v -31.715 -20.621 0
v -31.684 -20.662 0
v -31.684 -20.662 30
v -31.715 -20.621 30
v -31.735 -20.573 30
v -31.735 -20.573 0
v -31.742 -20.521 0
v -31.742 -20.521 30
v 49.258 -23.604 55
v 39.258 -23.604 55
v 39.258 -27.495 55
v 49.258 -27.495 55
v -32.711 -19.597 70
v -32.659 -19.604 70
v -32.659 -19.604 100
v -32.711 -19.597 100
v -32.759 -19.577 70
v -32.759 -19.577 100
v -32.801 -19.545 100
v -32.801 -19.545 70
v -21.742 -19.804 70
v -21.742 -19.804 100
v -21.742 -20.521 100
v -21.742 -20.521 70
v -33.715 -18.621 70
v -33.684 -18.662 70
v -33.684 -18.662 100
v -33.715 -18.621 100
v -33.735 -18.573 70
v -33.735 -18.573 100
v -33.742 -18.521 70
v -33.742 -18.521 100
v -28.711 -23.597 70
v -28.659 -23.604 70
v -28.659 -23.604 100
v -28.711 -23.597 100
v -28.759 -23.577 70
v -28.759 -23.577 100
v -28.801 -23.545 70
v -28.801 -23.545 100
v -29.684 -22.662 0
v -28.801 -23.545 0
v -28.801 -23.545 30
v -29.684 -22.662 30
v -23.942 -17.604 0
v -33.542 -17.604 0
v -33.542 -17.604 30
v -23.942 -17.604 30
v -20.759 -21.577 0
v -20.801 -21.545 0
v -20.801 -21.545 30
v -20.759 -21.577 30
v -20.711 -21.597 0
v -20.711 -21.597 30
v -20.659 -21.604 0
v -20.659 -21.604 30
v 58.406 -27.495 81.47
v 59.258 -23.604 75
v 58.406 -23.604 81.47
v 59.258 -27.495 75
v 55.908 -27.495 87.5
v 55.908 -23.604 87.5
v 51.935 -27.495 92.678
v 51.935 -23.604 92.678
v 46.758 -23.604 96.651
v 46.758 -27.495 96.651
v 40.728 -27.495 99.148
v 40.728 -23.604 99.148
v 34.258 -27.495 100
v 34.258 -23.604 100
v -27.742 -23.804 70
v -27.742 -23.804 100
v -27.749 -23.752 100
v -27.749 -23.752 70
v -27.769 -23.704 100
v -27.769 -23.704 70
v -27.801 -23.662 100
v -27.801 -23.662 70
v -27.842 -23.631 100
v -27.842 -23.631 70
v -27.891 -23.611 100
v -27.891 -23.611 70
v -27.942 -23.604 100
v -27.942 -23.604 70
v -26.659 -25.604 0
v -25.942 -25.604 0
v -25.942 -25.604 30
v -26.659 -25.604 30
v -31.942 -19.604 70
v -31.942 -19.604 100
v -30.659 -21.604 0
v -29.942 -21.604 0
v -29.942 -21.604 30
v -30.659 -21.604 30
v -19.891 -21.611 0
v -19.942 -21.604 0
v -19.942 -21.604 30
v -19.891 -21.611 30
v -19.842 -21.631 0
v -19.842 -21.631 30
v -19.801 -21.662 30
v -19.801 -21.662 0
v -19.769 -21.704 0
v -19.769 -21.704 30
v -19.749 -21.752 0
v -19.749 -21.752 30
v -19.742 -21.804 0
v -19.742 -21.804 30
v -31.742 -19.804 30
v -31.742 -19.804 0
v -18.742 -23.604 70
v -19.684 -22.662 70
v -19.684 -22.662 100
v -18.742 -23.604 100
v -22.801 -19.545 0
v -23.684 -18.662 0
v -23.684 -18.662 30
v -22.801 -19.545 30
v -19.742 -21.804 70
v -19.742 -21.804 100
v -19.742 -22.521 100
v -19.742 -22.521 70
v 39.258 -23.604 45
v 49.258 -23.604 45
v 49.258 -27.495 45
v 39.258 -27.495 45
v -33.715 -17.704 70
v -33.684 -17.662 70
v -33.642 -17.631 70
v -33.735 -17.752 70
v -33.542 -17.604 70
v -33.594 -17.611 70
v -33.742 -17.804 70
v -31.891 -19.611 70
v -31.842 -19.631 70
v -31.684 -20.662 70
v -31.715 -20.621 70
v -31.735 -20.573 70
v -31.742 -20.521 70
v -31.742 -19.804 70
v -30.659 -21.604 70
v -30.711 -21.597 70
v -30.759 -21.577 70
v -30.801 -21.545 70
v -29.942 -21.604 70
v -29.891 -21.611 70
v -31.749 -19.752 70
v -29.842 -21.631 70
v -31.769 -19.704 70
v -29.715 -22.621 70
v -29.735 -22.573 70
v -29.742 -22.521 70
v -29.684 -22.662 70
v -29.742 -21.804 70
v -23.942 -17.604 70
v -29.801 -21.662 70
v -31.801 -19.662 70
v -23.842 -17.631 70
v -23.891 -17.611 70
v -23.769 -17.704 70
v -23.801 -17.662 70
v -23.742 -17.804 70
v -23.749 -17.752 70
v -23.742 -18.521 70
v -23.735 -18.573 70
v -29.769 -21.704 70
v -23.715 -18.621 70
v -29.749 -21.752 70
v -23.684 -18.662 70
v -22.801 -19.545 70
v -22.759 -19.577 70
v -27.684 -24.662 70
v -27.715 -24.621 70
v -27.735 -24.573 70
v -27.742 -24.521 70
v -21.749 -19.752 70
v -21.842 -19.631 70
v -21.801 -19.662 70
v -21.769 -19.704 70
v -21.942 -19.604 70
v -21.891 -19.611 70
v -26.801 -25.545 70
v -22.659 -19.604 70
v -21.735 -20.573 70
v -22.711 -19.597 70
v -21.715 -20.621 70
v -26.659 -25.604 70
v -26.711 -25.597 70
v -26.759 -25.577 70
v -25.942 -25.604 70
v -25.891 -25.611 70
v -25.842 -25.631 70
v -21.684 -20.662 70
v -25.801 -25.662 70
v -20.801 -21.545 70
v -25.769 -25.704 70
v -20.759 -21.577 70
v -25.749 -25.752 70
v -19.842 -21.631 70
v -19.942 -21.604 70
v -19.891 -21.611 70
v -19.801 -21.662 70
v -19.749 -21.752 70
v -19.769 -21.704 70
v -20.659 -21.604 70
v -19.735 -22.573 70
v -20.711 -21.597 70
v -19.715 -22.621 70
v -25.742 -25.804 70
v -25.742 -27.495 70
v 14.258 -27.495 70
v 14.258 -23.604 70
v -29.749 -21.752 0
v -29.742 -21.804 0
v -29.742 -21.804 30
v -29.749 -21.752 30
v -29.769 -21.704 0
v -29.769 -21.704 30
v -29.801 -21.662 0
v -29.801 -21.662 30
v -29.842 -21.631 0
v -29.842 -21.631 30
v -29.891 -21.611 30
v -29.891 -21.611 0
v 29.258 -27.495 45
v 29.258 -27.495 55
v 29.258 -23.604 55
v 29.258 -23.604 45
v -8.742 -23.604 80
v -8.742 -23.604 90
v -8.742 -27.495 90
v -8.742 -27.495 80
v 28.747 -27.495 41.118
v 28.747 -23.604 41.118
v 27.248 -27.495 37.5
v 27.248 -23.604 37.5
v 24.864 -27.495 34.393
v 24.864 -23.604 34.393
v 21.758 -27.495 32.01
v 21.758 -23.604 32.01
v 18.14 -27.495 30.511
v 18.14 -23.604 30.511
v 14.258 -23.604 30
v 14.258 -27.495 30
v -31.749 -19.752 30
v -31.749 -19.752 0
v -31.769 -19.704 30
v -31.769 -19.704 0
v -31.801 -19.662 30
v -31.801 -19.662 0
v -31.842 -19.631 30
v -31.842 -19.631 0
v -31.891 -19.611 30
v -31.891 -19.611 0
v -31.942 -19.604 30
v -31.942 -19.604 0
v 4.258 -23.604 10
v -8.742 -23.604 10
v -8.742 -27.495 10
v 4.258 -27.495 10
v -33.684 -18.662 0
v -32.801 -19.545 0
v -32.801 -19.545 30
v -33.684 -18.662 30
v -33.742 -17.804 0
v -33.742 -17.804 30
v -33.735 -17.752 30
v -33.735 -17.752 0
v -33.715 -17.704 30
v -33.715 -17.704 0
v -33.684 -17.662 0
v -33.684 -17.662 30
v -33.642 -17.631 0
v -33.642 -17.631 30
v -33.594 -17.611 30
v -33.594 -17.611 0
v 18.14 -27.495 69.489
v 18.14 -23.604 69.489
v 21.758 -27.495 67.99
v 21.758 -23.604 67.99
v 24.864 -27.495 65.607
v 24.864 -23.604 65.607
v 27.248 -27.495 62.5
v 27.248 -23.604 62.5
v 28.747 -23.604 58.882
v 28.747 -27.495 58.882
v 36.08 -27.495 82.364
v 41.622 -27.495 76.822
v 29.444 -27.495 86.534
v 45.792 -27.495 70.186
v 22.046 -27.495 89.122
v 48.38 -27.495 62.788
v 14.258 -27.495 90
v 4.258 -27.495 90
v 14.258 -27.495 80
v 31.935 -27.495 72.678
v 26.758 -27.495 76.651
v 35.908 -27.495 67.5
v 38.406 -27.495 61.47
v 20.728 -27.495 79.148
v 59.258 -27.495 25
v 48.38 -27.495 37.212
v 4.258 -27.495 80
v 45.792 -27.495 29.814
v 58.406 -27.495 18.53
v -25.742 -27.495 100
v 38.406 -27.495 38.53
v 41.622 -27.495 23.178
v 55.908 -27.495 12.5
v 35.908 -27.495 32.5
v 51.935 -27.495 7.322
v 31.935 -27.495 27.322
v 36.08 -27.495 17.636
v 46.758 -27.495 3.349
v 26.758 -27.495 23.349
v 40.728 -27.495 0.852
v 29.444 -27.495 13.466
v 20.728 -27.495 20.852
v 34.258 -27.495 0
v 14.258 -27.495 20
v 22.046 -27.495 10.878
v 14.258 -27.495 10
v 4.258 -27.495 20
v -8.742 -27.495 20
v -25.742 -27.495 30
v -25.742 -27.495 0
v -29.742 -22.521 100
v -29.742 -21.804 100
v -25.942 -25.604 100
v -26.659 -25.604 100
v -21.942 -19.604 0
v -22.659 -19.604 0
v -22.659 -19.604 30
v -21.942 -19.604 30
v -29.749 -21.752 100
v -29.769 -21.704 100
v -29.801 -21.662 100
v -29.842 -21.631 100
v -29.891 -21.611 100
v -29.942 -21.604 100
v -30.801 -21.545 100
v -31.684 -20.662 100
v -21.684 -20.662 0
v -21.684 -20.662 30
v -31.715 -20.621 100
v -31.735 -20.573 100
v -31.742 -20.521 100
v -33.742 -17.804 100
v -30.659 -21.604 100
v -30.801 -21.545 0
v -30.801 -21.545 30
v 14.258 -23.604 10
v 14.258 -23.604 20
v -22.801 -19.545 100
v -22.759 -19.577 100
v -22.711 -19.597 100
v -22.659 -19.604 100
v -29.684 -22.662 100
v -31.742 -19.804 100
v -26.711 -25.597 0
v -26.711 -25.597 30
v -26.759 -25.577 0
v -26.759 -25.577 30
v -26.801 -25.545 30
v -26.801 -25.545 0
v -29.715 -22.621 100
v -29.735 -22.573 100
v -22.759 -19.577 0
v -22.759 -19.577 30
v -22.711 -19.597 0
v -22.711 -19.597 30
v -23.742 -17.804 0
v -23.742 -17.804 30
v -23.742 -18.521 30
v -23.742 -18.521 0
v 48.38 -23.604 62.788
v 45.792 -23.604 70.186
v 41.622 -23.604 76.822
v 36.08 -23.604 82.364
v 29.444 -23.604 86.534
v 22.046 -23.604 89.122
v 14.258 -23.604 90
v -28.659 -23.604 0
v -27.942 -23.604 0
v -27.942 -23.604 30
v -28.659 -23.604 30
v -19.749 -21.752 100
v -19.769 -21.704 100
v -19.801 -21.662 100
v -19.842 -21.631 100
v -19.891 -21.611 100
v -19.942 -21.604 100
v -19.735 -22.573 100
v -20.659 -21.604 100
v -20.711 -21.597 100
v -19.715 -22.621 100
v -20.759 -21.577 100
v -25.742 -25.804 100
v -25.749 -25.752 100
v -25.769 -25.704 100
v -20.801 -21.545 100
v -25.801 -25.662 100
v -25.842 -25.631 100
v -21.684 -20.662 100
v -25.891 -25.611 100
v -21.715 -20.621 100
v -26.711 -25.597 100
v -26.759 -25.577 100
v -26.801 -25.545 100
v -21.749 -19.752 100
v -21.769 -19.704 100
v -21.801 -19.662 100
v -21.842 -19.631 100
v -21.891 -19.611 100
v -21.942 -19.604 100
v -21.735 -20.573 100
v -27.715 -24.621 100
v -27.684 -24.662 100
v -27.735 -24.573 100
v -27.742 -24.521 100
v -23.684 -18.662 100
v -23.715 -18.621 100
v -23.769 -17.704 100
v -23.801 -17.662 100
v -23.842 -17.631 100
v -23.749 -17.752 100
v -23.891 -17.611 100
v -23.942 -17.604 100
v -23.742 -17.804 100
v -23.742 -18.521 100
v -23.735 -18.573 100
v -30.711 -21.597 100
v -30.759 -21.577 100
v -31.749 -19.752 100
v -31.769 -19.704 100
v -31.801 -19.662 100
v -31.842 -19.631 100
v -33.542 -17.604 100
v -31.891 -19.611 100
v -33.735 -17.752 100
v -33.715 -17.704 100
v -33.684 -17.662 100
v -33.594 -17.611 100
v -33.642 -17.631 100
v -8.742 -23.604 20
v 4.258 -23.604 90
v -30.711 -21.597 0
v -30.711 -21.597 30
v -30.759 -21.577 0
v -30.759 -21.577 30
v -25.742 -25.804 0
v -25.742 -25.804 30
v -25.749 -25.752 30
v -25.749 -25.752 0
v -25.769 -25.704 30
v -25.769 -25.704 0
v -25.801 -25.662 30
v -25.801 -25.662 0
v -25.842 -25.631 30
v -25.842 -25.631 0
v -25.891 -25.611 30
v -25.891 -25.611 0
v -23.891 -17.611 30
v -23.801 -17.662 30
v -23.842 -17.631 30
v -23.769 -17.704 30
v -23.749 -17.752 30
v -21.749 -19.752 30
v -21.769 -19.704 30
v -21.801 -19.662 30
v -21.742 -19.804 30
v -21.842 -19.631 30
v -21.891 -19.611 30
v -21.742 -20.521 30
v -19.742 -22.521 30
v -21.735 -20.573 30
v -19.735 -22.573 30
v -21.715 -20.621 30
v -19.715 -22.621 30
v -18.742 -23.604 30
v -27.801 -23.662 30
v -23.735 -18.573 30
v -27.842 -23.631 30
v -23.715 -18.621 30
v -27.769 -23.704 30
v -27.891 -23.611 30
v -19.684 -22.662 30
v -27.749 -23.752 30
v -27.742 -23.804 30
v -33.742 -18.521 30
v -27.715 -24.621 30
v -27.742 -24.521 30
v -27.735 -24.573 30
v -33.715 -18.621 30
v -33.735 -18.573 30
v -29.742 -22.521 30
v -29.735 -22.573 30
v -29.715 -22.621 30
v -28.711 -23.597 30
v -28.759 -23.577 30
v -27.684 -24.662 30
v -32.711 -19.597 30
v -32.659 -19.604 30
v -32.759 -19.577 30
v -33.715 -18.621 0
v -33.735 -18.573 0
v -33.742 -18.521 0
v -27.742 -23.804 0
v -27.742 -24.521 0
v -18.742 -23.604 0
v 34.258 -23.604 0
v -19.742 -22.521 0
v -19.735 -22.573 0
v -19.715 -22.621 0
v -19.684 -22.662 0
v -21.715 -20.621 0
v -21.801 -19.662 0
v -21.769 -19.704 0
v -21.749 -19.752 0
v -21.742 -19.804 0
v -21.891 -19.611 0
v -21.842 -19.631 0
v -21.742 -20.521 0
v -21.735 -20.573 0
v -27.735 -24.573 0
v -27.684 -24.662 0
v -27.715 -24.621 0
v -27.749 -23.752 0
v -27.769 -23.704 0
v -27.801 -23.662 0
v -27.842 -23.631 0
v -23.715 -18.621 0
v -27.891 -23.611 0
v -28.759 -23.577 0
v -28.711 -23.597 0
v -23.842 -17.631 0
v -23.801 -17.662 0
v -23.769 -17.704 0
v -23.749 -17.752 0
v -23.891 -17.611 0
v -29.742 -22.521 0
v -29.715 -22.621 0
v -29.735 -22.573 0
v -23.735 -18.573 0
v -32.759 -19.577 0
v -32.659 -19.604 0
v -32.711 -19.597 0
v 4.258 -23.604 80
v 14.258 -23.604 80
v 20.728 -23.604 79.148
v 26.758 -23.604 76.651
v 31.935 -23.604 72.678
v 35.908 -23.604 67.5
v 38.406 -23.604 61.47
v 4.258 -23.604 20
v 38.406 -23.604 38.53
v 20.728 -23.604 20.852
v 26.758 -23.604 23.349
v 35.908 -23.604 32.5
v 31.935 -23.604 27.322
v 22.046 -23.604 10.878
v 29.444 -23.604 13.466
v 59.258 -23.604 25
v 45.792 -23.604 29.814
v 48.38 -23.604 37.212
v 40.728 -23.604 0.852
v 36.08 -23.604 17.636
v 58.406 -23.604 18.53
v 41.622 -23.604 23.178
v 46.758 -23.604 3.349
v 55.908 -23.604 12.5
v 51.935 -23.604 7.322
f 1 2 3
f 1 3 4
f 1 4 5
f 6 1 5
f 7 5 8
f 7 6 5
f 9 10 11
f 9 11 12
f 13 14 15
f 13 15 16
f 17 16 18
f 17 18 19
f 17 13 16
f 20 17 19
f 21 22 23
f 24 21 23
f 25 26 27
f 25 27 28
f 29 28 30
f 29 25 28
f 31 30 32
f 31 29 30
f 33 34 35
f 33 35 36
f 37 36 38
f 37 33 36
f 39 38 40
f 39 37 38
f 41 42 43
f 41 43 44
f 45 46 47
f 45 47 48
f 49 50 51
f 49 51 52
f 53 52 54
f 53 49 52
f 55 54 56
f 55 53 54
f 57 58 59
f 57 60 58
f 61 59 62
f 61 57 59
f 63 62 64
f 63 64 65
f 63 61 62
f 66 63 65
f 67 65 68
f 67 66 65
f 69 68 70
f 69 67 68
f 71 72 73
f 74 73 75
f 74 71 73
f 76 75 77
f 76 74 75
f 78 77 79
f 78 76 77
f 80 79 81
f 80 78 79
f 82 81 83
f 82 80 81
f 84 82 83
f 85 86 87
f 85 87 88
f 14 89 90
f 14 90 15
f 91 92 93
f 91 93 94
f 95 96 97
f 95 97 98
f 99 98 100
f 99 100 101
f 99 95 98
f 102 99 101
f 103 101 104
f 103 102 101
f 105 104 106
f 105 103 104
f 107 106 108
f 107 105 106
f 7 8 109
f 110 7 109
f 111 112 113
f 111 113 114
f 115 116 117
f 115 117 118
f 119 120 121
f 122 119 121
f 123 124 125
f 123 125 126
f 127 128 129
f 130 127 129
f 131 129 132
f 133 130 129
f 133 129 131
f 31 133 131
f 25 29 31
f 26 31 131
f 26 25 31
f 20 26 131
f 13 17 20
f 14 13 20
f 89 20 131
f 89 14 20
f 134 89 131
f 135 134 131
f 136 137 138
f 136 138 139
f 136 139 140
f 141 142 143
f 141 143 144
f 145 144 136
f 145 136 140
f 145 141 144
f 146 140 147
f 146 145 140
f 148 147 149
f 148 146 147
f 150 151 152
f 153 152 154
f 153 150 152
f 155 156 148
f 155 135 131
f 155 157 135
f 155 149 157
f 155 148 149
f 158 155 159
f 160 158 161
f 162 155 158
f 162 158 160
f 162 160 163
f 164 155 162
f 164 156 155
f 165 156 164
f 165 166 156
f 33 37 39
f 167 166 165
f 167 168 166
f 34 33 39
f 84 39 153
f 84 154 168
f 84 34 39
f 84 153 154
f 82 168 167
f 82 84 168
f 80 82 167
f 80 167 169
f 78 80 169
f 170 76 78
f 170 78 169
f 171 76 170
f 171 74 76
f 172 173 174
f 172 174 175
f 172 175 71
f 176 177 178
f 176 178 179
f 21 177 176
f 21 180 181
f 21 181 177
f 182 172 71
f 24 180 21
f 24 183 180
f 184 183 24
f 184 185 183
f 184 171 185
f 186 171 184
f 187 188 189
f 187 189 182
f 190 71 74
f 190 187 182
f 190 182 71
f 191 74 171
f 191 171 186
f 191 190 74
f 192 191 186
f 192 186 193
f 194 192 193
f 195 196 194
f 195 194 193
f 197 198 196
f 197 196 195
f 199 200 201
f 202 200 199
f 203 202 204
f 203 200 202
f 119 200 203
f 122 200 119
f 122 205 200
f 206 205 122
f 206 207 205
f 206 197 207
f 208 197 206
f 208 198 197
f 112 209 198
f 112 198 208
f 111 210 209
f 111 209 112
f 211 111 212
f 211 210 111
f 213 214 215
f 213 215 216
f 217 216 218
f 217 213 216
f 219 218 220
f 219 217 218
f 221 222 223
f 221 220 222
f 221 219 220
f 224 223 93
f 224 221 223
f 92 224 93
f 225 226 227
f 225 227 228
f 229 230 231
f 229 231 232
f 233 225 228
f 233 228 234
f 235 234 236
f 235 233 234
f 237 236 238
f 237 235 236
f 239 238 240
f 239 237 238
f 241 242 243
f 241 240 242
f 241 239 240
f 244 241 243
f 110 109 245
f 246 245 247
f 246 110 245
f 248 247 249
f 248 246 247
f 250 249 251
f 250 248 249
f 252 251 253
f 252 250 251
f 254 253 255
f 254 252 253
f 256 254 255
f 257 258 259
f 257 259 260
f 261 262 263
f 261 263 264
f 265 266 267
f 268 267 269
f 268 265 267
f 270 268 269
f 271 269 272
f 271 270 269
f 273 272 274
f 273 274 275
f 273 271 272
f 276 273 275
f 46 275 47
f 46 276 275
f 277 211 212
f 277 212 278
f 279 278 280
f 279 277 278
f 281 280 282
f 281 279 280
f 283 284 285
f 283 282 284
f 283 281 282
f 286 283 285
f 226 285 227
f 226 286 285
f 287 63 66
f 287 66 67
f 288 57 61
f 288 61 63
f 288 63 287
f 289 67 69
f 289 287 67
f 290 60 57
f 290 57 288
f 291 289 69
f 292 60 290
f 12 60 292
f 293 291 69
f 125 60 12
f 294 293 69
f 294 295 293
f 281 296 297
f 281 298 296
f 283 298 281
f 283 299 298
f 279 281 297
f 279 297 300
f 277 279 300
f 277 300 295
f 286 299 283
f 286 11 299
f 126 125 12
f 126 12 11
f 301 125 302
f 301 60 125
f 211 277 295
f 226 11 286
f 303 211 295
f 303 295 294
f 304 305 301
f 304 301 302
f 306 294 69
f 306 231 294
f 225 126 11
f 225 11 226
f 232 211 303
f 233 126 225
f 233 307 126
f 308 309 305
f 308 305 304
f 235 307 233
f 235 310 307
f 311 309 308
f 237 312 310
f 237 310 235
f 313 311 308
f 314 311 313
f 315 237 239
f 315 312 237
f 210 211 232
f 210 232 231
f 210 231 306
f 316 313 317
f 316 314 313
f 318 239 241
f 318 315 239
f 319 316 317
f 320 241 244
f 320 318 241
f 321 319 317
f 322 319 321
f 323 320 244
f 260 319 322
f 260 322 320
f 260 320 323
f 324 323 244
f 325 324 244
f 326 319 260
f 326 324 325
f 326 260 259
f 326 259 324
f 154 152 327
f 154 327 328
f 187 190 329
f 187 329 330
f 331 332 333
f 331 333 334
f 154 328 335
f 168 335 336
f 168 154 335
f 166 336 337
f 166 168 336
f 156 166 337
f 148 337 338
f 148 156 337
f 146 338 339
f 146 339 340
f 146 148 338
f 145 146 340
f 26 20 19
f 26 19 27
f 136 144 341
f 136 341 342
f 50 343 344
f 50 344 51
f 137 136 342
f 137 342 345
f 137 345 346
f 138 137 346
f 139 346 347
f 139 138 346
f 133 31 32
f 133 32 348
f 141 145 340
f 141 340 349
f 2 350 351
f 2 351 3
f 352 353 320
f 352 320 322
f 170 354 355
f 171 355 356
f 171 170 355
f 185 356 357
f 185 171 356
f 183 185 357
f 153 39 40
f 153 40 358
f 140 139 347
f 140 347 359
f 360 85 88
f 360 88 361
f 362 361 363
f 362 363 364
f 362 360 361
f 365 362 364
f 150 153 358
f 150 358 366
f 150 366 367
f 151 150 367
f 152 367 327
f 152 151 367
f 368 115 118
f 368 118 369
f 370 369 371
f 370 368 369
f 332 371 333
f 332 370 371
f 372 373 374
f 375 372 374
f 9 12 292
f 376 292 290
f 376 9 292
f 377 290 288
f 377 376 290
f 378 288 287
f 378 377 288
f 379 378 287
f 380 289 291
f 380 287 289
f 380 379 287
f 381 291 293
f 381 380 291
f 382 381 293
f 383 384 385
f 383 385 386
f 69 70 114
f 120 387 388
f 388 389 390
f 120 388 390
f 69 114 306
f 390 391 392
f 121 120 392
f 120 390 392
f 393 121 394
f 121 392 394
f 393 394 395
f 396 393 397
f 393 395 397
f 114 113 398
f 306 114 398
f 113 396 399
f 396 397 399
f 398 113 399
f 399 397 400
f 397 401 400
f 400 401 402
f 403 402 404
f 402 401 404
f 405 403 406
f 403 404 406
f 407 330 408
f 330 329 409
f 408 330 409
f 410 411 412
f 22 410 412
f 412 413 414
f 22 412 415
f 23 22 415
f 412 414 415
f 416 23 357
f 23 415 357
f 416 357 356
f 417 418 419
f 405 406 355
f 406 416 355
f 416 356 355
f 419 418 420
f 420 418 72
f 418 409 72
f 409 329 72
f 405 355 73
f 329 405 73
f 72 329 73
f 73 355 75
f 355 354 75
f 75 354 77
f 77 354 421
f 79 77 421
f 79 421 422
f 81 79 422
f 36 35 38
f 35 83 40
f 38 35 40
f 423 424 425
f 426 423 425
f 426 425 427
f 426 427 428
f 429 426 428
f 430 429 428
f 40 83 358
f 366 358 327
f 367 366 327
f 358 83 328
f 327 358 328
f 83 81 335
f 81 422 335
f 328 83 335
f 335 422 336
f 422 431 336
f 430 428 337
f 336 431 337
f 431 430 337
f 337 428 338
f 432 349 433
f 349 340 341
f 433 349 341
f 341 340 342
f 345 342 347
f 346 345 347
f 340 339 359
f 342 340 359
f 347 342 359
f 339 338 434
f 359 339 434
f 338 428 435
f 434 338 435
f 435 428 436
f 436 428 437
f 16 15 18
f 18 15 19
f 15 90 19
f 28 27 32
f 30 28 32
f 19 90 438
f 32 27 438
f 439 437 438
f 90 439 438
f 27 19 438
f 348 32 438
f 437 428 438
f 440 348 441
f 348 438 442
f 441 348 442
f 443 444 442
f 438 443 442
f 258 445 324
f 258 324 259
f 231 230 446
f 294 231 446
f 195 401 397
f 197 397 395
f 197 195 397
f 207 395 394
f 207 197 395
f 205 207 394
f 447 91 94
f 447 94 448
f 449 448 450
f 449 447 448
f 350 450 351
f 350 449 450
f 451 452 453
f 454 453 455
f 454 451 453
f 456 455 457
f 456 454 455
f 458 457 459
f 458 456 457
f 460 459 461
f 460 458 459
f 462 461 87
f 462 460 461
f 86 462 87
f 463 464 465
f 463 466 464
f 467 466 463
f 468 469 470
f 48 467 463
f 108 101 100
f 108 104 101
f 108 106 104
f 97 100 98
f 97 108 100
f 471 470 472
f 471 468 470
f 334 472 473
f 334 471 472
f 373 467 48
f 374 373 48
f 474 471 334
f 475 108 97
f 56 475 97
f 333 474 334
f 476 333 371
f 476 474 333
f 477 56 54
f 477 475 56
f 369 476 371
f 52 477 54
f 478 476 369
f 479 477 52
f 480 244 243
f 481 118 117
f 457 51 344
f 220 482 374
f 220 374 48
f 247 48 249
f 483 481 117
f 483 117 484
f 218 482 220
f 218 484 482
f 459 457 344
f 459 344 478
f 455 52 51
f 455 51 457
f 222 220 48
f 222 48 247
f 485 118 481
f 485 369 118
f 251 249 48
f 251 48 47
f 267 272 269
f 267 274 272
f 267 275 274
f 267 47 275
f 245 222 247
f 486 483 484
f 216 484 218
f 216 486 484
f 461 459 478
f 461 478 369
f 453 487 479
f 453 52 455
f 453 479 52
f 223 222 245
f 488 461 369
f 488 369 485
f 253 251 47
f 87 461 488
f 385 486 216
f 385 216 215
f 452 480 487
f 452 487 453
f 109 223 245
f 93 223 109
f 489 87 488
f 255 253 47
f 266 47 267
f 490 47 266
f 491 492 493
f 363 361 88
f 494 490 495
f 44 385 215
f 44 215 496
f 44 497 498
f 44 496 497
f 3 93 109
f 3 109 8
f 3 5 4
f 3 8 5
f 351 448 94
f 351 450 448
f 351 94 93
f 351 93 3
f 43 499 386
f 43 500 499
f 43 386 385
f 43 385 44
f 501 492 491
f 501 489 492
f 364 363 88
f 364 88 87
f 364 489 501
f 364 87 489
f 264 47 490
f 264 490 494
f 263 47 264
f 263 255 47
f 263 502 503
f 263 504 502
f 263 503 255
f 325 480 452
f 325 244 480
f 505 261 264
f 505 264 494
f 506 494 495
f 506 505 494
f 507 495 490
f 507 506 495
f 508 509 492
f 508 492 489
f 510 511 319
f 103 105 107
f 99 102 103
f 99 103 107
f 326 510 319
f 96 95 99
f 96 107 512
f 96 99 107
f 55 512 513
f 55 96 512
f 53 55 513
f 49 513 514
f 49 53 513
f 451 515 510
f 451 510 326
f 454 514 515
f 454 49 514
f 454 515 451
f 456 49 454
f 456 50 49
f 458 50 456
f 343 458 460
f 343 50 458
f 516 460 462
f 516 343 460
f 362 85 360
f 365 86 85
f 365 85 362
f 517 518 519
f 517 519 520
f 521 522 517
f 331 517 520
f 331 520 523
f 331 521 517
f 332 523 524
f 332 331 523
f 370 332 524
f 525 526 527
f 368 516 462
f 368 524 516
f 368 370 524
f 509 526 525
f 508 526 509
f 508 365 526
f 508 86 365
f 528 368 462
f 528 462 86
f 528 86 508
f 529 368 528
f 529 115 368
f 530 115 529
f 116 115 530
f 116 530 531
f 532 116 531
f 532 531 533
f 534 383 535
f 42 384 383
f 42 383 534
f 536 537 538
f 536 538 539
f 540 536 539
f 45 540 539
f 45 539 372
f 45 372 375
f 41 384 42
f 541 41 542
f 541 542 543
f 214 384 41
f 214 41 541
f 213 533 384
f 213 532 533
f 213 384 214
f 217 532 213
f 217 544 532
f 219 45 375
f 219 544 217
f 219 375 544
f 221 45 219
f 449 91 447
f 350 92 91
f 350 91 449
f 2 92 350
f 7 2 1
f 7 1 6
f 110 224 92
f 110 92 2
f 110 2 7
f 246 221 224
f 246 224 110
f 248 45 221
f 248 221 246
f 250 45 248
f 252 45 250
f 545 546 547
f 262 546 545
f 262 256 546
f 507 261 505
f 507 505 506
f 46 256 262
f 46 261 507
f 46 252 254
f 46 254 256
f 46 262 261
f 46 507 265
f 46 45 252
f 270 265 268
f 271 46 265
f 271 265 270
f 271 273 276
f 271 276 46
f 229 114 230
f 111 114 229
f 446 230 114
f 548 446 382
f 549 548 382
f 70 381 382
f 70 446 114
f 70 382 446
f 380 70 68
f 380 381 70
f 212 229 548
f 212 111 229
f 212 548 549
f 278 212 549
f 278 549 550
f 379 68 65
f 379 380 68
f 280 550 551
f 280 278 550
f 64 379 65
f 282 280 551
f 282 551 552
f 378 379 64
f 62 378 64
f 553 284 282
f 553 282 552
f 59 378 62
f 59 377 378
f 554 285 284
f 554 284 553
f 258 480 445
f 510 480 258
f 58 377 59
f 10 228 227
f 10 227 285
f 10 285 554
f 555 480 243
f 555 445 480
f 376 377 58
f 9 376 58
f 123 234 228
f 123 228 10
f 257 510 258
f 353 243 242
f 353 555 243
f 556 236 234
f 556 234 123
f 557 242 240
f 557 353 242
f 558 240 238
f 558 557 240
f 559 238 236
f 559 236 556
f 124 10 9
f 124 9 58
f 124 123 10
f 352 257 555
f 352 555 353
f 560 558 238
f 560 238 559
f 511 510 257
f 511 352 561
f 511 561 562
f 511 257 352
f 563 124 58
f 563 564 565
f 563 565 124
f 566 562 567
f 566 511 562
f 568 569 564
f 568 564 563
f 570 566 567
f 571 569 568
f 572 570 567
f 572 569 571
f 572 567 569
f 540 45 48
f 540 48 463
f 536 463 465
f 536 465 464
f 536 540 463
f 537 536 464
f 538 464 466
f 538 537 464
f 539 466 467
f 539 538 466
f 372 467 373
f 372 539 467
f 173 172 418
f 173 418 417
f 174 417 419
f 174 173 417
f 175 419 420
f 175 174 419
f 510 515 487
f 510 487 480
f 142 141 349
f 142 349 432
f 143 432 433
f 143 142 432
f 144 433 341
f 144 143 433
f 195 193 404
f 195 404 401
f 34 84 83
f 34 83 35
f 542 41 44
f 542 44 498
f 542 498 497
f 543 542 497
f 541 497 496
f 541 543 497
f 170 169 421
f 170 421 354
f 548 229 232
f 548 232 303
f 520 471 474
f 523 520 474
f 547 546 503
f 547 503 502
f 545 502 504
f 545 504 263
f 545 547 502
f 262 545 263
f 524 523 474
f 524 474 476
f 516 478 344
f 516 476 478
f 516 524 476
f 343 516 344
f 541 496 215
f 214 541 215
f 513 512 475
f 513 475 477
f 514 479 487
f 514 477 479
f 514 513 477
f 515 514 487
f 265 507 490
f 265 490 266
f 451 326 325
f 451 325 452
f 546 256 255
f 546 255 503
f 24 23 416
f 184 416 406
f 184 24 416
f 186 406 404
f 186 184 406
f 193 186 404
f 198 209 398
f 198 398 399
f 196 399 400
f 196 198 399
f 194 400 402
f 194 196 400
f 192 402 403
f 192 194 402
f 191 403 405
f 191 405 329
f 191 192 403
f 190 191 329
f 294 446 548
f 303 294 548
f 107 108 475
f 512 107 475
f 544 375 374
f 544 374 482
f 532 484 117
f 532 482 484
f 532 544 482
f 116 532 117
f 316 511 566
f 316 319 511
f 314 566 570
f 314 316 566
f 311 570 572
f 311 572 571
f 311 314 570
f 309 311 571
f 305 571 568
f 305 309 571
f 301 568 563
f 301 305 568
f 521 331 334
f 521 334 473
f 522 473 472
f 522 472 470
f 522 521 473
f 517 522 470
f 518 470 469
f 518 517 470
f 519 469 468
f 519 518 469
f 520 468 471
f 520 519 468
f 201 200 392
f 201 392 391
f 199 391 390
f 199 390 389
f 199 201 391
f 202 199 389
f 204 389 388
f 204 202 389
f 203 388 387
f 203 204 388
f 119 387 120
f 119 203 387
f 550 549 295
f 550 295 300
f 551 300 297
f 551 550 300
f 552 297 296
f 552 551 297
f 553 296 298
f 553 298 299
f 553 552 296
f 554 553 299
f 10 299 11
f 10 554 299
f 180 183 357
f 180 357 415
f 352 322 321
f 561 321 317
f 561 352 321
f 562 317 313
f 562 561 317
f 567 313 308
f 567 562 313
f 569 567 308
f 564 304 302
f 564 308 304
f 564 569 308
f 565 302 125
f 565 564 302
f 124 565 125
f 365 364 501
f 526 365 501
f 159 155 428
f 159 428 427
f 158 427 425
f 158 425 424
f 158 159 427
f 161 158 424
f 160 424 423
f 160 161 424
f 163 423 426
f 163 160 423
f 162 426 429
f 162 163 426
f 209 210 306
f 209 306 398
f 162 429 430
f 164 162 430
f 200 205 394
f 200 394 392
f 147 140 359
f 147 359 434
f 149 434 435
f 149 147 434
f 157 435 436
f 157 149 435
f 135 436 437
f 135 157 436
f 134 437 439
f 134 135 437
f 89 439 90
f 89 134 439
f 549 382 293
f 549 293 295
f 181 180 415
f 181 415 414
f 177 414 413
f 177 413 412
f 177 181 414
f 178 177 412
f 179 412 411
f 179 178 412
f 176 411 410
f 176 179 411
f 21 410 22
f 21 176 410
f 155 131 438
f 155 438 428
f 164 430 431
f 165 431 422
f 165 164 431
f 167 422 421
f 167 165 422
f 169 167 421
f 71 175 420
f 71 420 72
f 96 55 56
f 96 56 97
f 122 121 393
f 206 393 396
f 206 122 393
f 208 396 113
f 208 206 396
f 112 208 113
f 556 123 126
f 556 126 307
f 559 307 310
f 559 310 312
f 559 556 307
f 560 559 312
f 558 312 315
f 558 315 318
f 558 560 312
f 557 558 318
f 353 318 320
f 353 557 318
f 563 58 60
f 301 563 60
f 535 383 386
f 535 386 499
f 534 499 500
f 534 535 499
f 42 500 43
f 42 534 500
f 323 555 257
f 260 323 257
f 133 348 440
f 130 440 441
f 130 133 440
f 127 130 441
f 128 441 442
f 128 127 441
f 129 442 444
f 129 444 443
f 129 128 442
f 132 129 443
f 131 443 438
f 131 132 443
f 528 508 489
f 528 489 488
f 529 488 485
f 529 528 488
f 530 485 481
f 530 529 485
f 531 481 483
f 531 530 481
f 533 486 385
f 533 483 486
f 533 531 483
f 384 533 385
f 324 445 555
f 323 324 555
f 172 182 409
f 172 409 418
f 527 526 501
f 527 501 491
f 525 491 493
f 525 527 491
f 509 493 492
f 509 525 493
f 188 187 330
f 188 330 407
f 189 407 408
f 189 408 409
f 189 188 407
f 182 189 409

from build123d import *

# Parameters (mm, degrees)
BOSS_EXTRUDE1_DEPTH     = 100
CUT_EXTRUDE1_DEPTH      = 24
CUT_EXTRUDE1_DEPTH_BACK = 24
FILLET2_R               = 25
SKETCH4_W               = 13
SKETCH4_H               = 10
CUT_EXTRUDE3_DEPTH      = 23


with BuildPart() as part:
    # Sketch1 → Boss-Extrude1 (new body)
    with BuildSketch(Plane.XY):
        with BuildLine():
            Line((-25.742274507, -27.495485701), (-25.742274507, -25.803839777))
            ThreePointArc((-25.742274507, -25.803839777), (-25.800853151, -25.66241842), (-25.942274507, -25.603839777))
            Line((-25.942274507, -25.603839777), (-26.659431795, -25.603839777))
            ThreePointArc((-26.659431795, -25.603839777), (-26.735968481, -25.588615683), (-26.800853151, -25.545261133))
            Line((-26.800853151, -25.545261133), (-27.683698081, -24.662416203))
            ThreePointArc((-27.683698081, -24.662416203), (-27.72705275, -24.597531247), (-27.742276725, -24.520994228))
            Line((-27.742276725, -24.520994228), (-27.742274507, -23.803840395))
            ThreePointArc((-27.742274507, -23.803840395), (-27.800852932, -23.662418639), (-27.942274507, -23.603839777))
            Line((-27.942274507, -23.603839777), (-28.659430376, -23.603840885))
            ThreePointArc((-28.659430376, -23.603840885), (-28.735967229, -23.588616851), (-28.800852042, -23.545262242))
            Line((-28.800852042, -23.545262242), (-29.683696972, -22.662417311))
            ThreePointArc((-29.683696972, -22.662417311), (-29.727051582, -22.597532499), (-29.742275616, -22.520995646))
            Line((-29.742275616, -22.520995646), (-29.742274507, -21.803839777))
            ThreePointArc((-29.742274507, -21.803839777), (-29.800853256, -21.662418316), (-29.942274803, -21.603839777))
            Line((-29.942274803, -21.603839777), (-30.659430376, -21.603840885))
            ThreePointArc((-30.659430376, -21.603840885), (-30.735967229, -21.588616851), (-30.800852042, -21.545262242))
            Line((-30.800852042, -21.545262242), (-31.683696972, -20.662417311))
            ThreePointArc((-31.683696972, -20.662417311), (-31.727051582, -20.597532499), (-31.742275616, -20.520995646))
            Line((-31.742275616, -20.520995646), (-31.742274507, -19.80383981))
            ThreePointArc((-31.742274507, -19.80383981), (-31.800854095, -19.662417476), (-31.942277212, -19.603839777))
            Line((-31.942277212, -19.603839777), (-32.659432785, -19.603840885))
            ThreePointArc((-32.659432785, -19.603840885), (-32.735969638, -19.588616851), (-32.80085445, -19.545262242))
            Line((-32.80085445, -19.545262242), (-33.683699381, -18.662417311))
            ThreePointArc((-33.683699381, -18.662417311), (-33.727054119, -18.597532189), (-33.742278024, -18.520994974))
            Line((-33.742278024, -18.520994974), (-33.742274507, -17.803842952))
            ThreePointArc((-33.742274507, -17.803842952), (-33.683696986, -17.662419543), (-33.542274507, -17.603839777))
            Line((-33.542274507, -17.603839777), (-23.942274507, -17.603839777))
            ThreePointArc((-23.942274507, -17.603839777), (-23.800853151, -17.66241842), (-23.742274507, -17.803839777))
            Line((-23.742274507, -17.803839777), (-23.742274507, -18.520997064))
            ThreePointArc((-23.742274507, -18.520997064), (-23.727050414, -18.597533751), (-23.683695863, -18.66241842))
            Line((-23.683695863, -18.66241842), (-22.800853151, -19.545261133))
            ThreePointArc((-22.800853151, -19.545261133), (-22.735968481, -19.588615683), (-22.659431795, -19.603839777))
            Line((-22.659431795, -19.603839777), (-21.942274507, -19.603839777))
            ThreePointArc((-21.942274507, -19.603839777), (-21.800853151, -19.66241842), (-21.742274507, -19.803839777))
            Line((-21.742274507, -19.803839777), (-21.742274507, -20.520997064))
            ThreePointArc((-21.742274507, -20.520997064), (-21.727050414, -20.597533751), (-21.683695863, -20.66241842))
            Line((-21.683695863, -20.66241842), (-20.800853151, -21.545261133))
            ThreePointArc((-20.800853151, -21.545261133), (-20.735968481, -21.588615683), (-20.659431795, -21.603839777))
            Line((-20.659431795, -21.603839777), (-19.942274507, -21.603839777))
            ThreePointArc((-19.942274507, -21.603839777), (-19.800853151, -21.66241842), (-19.742274507, -21.803839777))
            Line((-19.742274507, -21.803839777), (-19.742274507, -22.520997064))
            ThreePointArc((-19.742274507, -22.520997064), (-19.727050414, -22.597533751), (-19.683695863, -22.66241842))
            Line((-19.683695863, -22.66241842), (-18.742274507, -23.603839777))
            Line((-18.742274507, -23.603839777), (-17.742274507, -23.603839777))
            Line((-17.742274507, -23.603839777), (59.257725493, -23.603839777))
            Line((59.257725493, -23.603839777), (59.257725493, -27.495485701))
            Line((59.257725493, -27.495485701), (-25.742274507, -27.495485701))
        make_face()
    extrude(amount=BOSS_EXTRUDE1_DEPTH)

    # Sketch2 → Cut-Extrude1 (cut, two sides: drawn at the far end of the back side and taken through both)
    with BuildSketch(Plane(origin=(0, -23.603839777, 0), x_dir=(1, 0, 0), z_dir=(0, 1, 0)).offset(-CUT_EXTRUDE1_DEPTH_BACK)):
        with BuildLine():
            Line((14.257725493, -30), (-42.622702361, -30))
            Line((-42.622702361, -30), (-42.622702361, -70))
            Line((-42.622702361, -70), (14.257725493, -70))
            ThreePointArc((14.257725493, -70), (24.864327211, -65.606601718), (29.257725493, -55))
            Line((29.257725493, -55), (29.257725493, -45))
            ThreePointArc((29.257725493, -45), (24.864327211, -34.393398282), (14.257725493, -30))
        make_face()
    extrude(amount=CUT_EXTRUDE1_DEPTH + CUT_EXTRUDE1_DEPTH_BACK, mode=Mode.SUBTRACT)

    # Fillet2
    fillet2_edges = [part.edges().sort_by_distance(p)[0] for p in [
        (59.257725493, -25.549662739, 100),
        (59.257725493, -25.549662739, 0),
    ]]
    fillet(fillet2_edges, radius=FILLET2_R)

    # Sketch4 → Cut-Extrude3 (cut)
    with BuildSketch(Plane(origin=(0, -23.603839777, 0), x_dir=(1, 0, 0), z_dir=(0, 1, 0))):
        with BuildLine():
            Line((14.257725493, -90), (14.257725493, -80))
            ThreePointArc((14.257725493, -80), (31.935395023, -72.67766953), (39.257725493, -55))
            Line((39.257725493, -55), (49.257725493, -55))
            ThreePointArc((49.257725493, -55), (39.006462834, -79.748737342), (14.257725493, -90))
        make_face()
        with Locations((-2.242274507, -85)):
            Rectangle(SKETCH4_W, SKETCH4_H)
        with BuildLine():
            Line((14.257725493, -20), (14.257725493, -10))
            ThreePointArc((14.257725493, -10), (39.006462834, -20.251262658), (49.257725493, -45))
            Line((49.257725493, -45), (39.257725493, -45))
            ThreePointArc((39.257725493, -45), (31.935395023, -27.32233047), (14.257725493, -20))
        make_face()
        with Locations((-2.242274507, -15)):
            Rectangle(SKETCH4_W, SKETCH4_H)
    extrude(amount=-CUT_EXTRUDE3_DEPTH, mode=Mode.SUBTRACT)


solid = part.part
